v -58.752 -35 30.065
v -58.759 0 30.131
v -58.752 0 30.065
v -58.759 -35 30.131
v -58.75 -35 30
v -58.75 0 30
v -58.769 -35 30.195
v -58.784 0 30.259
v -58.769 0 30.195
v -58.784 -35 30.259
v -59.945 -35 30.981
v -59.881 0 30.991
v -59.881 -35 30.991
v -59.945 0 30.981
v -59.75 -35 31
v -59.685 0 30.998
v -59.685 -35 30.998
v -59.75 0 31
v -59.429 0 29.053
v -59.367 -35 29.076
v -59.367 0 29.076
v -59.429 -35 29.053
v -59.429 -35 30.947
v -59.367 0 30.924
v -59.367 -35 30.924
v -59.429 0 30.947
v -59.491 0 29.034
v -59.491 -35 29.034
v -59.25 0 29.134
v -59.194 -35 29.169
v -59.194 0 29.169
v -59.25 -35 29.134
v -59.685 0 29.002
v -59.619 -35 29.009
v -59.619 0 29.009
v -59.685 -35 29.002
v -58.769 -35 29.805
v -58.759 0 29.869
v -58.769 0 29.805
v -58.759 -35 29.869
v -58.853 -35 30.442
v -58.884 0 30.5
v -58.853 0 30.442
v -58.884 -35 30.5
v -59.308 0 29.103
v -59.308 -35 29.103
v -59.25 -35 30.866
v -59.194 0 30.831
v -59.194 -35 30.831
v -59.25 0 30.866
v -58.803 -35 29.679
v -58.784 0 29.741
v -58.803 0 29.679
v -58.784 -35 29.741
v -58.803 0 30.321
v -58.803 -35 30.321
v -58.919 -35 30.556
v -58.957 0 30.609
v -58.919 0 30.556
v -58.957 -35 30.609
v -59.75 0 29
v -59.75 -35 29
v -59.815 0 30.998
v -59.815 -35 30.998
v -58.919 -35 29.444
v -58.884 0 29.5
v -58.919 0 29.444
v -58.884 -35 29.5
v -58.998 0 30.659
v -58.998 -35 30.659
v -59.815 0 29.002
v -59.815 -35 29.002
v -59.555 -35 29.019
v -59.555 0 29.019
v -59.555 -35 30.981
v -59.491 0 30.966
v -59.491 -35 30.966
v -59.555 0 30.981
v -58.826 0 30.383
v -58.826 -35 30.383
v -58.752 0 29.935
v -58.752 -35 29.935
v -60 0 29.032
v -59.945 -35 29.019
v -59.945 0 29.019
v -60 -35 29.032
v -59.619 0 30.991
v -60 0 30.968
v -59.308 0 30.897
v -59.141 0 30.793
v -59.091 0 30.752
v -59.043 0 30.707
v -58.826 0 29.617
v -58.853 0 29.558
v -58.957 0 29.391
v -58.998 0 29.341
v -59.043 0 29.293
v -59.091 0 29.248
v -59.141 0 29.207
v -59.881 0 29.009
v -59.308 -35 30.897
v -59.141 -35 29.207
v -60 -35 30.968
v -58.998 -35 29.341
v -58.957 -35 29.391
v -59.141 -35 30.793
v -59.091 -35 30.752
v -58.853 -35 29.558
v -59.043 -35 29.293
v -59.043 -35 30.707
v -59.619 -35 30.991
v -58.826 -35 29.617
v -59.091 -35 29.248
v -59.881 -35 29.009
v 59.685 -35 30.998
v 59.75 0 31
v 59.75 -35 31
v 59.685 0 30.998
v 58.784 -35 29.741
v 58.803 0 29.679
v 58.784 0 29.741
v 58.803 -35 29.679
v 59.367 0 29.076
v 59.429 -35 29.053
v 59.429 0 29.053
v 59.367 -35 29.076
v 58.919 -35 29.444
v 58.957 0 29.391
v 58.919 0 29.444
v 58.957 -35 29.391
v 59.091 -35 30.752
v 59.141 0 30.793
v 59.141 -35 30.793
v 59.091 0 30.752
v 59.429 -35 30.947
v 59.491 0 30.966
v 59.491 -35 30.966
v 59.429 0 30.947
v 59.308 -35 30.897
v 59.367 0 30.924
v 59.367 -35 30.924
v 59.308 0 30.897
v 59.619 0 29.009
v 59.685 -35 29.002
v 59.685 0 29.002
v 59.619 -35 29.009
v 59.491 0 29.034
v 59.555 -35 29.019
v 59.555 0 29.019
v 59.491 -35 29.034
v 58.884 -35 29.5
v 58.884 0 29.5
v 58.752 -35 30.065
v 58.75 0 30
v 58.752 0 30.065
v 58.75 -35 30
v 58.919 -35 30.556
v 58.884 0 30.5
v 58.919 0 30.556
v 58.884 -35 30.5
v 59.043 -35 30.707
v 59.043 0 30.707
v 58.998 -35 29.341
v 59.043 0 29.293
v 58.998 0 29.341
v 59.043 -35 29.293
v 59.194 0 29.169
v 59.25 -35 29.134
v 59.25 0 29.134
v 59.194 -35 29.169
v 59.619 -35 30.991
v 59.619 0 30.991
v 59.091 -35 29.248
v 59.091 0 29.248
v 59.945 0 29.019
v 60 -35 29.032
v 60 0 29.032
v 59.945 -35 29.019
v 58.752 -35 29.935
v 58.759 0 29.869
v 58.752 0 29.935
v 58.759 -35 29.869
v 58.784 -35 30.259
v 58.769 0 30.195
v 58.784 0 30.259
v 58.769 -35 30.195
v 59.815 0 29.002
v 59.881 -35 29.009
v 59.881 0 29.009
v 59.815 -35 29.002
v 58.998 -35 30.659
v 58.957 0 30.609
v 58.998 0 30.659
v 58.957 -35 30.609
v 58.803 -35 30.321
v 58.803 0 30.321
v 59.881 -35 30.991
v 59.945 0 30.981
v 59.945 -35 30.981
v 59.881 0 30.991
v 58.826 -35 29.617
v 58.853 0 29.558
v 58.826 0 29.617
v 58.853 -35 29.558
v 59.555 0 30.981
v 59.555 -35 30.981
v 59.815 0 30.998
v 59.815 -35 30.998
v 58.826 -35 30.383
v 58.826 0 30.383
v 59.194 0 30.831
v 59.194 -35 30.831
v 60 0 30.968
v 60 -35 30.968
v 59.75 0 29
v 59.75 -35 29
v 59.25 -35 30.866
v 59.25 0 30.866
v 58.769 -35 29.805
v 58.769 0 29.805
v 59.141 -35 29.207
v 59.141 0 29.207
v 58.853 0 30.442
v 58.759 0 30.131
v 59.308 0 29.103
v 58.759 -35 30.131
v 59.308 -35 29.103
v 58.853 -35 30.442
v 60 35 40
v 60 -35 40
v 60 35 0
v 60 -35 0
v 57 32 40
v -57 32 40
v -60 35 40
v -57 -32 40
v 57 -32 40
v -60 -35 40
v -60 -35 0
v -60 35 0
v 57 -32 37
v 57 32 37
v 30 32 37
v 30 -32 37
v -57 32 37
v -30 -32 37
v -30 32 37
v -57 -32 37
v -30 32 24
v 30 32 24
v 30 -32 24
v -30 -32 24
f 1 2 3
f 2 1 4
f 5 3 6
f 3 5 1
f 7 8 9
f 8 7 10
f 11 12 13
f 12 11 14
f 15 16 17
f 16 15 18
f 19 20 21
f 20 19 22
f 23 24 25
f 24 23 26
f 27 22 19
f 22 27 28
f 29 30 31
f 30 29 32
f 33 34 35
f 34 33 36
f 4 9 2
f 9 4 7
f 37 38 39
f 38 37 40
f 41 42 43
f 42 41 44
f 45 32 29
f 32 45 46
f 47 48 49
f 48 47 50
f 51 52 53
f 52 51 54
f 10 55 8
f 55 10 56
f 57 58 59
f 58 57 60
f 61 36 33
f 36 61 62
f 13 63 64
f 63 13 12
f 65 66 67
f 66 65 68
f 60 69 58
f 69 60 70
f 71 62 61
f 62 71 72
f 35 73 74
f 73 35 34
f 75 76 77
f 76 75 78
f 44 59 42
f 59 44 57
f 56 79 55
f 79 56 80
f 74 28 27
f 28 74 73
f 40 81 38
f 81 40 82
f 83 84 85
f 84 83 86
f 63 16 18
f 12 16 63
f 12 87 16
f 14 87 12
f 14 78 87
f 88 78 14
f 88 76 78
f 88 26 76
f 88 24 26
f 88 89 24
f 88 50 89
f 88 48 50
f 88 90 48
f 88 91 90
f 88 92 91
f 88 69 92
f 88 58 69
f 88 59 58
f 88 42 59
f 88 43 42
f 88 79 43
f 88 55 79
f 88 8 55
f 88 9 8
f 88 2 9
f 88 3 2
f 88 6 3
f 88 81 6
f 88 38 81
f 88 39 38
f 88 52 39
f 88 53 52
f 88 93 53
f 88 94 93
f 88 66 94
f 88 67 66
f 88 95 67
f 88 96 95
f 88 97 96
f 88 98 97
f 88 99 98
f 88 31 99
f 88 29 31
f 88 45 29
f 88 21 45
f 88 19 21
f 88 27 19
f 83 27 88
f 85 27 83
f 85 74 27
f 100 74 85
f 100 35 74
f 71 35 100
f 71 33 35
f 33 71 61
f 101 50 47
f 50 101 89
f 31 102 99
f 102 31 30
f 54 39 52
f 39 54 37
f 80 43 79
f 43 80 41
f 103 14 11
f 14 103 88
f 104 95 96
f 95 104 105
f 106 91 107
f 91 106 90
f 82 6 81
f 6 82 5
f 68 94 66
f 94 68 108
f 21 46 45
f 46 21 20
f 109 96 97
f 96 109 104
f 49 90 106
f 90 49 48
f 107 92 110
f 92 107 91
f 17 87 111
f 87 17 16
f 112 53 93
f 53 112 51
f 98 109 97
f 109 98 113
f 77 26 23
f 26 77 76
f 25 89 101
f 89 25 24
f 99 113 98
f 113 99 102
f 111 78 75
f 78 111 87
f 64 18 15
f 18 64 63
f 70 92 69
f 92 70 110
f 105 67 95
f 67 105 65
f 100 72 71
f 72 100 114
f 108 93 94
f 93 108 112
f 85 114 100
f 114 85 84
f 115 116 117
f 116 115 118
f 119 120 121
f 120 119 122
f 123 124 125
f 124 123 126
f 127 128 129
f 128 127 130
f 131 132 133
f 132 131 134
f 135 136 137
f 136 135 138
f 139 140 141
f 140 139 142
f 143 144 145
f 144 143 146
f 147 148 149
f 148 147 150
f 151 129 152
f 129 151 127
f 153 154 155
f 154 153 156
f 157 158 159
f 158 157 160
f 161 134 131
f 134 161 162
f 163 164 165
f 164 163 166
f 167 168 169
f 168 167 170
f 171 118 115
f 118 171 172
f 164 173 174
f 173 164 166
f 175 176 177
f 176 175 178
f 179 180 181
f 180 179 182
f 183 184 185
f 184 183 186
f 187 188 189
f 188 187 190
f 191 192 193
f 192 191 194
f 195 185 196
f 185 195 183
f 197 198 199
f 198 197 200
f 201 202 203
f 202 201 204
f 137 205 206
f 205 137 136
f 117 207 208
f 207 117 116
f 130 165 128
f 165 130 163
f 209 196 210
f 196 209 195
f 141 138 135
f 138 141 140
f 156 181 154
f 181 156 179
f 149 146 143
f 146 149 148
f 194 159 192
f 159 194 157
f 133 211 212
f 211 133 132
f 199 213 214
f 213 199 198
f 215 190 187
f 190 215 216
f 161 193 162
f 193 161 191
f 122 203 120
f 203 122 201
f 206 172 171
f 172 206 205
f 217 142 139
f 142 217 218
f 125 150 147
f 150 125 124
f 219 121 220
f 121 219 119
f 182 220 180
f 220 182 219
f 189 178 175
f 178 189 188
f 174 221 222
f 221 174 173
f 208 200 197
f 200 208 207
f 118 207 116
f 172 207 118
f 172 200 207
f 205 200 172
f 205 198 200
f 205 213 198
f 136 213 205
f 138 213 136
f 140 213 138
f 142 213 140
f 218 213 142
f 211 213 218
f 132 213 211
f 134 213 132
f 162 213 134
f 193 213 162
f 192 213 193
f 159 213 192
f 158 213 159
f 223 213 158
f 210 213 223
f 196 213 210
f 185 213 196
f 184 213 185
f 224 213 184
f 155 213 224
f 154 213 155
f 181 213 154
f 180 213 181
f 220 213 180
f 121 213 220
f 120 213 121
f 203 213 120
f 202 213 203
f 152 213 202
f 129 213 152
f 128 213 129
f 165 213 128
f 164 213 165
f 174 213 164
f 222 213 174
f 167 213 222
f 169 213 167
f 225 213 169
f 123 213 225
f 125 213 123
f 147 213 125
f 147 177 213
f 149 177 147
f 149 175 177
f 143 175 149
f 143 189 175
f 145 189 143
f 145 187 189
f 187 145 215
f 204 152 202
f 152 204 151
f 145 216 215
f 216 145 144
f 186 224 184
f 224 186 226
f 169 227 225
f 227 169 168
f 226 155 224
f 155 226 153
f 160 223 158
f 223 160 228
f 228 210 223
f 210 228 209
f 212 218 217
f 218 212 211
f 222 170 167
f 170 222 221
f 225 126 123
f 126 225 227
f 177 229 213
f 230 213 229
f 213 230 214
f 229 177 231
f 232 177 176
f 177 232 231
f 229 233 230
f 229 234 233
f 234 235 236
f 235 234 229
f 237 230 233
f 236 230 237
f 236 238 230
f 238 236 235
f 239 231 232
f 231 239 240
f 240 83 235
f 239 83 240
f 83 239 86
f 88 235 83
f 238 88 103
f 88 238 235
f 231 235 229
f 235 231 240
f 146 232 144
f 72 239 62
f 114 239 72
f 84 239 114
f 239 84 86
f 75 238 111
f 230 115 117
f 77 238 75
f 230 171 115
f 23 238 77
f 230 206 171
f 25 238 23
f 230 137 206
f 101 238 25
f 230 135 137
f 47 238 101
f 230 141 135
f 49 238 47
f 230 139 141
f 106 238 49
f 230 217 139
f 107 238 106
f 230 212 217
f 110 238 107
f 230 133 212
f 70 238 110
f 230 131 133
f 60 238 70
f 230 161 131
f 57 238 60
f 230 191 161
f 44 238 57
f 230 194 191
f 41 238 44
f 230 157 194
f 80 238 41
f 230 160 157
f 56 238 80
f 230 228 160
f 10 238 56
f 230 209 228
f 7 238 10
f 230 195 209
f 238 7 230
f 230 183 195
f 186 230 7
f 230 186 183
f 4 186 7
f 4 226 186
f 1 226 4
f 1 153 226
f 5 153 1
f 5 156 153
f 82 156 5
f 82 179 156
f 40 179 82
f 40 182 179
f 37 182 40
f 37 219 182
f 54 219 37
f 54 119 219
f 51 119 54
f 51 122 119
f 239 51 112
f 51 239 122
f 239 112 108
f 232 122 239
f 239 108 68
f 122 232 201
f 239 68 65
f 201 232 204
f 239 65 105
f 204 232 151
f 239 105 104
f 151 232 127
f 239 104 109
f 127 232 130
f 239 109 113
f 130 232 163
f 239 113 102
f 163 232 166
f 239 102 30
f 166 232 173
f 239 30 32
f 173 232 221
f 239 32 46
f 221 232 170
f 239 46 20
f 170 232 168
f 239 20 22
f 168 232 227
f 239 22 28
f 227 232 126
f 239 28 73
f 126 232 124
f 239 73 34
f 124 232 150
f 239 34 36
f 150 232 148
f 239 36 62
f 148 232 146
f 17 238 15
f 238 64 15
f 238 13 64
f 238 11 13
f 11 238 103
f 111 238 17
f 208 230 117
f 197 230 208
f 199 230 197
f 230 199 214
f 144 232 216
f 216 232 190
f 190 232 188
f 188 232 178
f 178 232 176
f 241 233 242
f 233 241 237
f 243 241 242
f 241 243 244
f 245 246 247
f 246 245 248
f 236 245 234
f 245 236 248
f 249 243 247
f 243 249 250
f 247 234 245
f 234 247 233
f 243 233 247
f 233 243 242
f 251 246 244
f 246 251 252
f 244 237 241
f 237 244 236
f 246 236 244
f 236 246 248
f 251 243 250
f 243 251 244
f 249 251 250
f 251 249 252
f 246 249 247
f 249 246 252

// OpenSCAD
// Mini horizontal gel-electrophoresis box - buffer tank
// Print orientation: tank base on XY plane, opening upward (+Z)

// ---------------- Parameters ----------------
outer_x      = 120;   // outer length along X (mm)
outer_y      = 70;    // outer width along Y (mm)
outer_h      = 40;    // outer height along Z (mm)
wall         = 3;     // wall thickness (mm)
floor        = 3;     // floor thickness (mm)

platform_x   = 60;    // platform length along X (mm)
platform_z   = 10;    // platform height above inner floor (mm)

hole_d       = 2;     // electrode wire hole diameter (mm)
hole_y       = 0;     // hole centre Y position (mm)
hole_z       = 30;    // hole centre Z position (mm)

eps          = 0.5;   // cutter overshoot past faces (mm)

$fn = 96;

// Derived (inner) dimensions
inner_h = outer_h - floor - wall;          // 34 mm
inner_x = outer_x - 2 * wall;              // 114 mm
inner_y = outer_y - 2 * wall;              // 64 mm

// ---------------- Model ----------------
difference() {
    // Main tank body
    translate([-outer_x / 2, -outer_y / 2, 0])
        cube([outer_x, outer_y, outer_h]);

    // Open top
    translate([-inner_x / 2, -inner_y / 2, outer_h - wall])
        cube([inner_x, inner_y, wall + eps]);

    // Central raised platform (solid)
    translate([-platform_x / 2, -inner_y / 2, inner_h - platform_z])
        cube([platform_x, inner_y, platform_z + wall]);

    // Electrode wire holes through end walls, along X
    for (sx = [-1, 1])
        translate([sx * (outer_x / 2 - eps / 2), hole_y, hole_z])
            rotate([90, 0, 0])
                cylinder(d = hole_d, h = outer_x + 2 * eps);
}
